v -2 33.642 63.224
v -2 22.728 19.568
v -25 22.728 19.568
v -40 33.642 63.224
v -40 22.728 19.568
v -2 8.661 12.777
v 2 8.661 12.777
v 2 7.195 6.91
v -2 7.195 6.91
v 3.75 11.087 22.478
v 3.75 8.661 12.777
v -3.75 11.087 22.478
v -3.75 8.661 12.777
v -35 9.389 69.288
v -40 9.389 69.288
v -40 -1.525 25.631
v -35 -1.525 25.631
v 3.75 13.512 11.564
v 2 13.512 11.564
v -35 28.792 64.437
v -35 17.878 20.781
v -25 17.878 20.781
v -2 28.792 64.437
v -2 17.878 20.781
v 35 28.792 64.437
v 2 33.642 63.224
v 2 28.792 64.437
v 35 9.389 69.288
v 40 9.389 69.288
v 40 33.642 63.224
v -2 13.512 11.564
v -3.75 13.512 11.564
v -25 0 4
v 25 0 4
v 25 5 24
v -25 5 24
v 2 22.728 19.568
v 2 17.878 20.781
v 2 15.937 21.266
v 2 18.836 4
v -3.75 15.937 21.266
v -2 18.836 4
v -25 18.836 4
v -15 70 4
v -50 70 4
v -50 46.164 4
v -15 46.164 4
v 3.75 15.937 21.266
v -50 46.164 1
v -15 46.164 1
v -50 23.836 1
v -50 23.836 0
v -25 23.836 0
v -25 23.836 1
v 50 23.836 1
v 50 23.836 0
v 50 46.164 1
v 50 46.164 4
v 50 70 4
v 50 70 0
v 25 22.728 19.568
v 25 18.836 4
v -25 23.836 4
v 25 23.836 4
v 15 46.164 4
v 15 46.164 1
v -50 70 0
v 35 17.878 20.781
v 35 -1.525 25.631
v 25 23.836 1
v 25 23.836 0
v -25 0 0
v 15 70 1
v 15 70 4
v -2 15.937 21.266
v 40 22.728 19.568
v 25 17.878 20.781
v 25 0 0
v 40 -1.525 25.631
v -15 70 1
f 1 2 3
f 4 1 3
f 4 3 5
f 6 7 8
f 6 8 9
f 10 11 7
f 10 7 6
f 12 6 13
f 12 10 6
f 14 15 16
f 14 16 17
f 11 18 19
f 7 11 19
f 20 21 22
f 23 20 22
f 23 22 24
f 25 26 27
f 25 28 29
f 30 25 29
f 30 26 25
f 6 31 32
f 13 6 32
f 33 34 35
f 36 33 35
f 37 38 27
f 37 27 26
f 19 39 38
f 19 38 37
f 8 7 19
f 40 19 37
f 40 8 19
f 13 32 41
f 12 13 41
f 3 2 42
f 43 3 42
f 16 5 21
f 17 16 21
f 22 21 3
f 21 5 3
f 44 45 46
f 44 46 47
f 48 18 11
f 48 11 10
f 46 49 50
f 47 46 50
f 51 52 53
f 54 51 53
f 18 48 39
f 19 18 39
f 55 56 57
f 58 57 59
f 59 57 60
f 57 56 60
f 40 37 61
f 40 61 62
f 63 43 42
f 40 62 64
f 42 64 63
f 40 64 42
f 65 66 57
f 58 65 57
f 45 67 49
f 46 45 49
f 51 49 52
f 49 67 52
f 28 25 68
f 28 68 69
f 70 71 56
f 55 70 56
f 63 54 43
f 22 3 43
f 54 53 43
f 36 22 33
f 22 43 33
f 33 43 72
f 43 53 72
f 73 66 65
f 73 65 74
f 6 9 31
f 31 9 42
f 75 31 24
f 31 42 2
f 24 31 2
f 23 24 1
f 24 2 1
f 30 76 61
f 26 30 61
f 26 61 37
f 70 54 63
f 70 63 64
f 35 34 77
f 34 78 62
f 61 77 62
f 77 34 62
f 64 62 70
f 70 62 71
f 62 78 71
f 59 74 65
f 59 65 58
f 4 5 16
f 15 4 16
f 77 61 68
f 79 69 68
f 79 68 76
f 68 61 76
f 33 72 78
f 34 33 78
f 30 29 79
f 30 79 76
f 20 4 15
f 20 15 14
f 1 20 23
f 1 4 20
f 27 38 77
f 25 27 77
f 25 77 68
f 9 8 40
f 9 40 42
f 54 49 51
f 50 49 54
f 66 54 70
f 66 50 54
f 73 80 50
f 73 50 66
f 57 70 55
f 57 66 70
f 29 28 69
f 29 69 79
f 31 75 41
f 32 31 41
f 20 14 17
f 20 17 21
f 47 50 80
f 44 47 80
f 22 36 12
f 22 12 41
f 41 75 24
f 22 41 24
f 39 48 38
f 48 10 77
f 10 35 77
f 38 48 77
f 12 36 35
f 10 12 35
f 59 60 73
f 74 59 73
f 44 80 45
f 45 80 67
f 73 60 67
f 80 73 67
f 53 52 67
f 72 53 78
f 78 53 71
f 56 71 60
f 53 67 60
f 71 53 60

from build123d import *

# Parameters (mm, degrees)
F1_DEPTH  = 1
F0_W      = 50
F0_H      = 23.8363201171
F0_W_2    = 35
F2_DEPTH  = 4
F3_W      = 50
F3_H      = 5
F3_H_2    = 13.8363201171
F4_DEPTH  = 20
F6_DEPTH  = 50
F7_W      = 4
F7_H      = 10
F7_H_2    = 6.0470494551
F8_DEPTH  = 12
F9_START  = -7
F7_W_2    = 1.75
F9_DEPTH  = 5
F10_W     = 23
F10_H     = 5
F11_DEPTH = 45


with BuildPart() as f1:
    # F0 (on Top) → F1 (new body)
    with BuildSketch(Plane.XY):
        Polygon((-50, 46.1636798829), (-50, 23.8363201171), (-25, 23.8363201171), (25, 23.8363201171), (50, 23.8363201171), (50, 46.1636798829), (15, 46.1636798829), (15, 70), (-15, 70), (-15, 46.1636798829), align=None)
    extrude(amount=F1_DEPTH)

    # F0 (on Top) → F2 (join)
    with BuildSketch(Plane.XY):
        with Locations((0, 11.9181600586)):
            Rectangle(F0_W, F0_H)
        with Locations((32.5, 58.0818399414)):
            Rectangle(F0_W_2, F0_H)
        with Locations((-32.5, 58.0818399414)):
            Rectangle(F0_W_2, F0_H)
    extrude(amount=F2_DEPTH)

    # F3 (on face) → F4 (join)
    with BuildSketch(Plane.XY.offset(4)):
        with Locations((0, 21.3363201171)):
            Rectangle(F3_W, F3_H)
        with Locations((0, 11.9181600586)):
            Rectangle(F3_W, F3_H_2)
        with Locations((0, 2.5)):
            Rectangle(F3_W, F3_H)
    extrude(amount=F4_DEPTH)

    # F5 (on face) → F6 (cut)
    with BuildSketch(Plane.YZ.offset(25)):
        Polygon((0, 24), (0, 4), (5, 24), align=None)
        Polygon((22.7283012867, 19.5679246783), (18.8363201171, 4), (23.8363201171, 4), (23.8363201171, 24), align=None)
        Polygon((23.8363201171, 24), (5, 24), (22.7283012867, 19.5679246783), align=None)
    extrude(amount=-F6_DEPTH, mode=Mode.SUBTRACT)

    # F7 (on face) → F8 (cut)
    with BuildSketch(Plane(origin=(0, 16.7871248161, -4.196781204), x_dir=(-1, 0, 0), z_dir=(0, 0.9701425001, -0.242535625))):
        with Locations((0, 19.4960981287)):
            Rectangle(F7_W, F7_H)
        with Locations((0, 11.4725734011)):
            Rectangle(F7_W, F7_H_2)
    extrude(amount=-F8_DEPTH, mode=Mode.SUBTRACT)

    # F7 (on face) → F9 (cut)
    with BuildSketch(Plane(origin=(0, 16.7871248161, -4.196781204), x_dir=(-1, 0, 0), z_dir=(0, 0.9701425001, -0.242535625)).offset(F9_START)):
        with Locations((2.875, 19.4960981287)):
            Rectangle(F7_W_2, F7_H)
        with Locations((-2.875, 19.4960981287)):
            Rectangle(F7_W_2, F7_H)
    extrude(amount=-F9_DEPTH, mode=Mode.SUBTRACT)

    # F10 (on face) → F11 (join)
    with BuildSketch(Plane(origin=(0, 5.9411764706, 23.7647058824), x_dir=(1, 0, 0), z_dir=(0, 0.242535625, 0.9701425001))):
        Polygon((40, 17.3037721918), (25, 17.3037721918), (25, 12.3037721918), (35, 12.3037721918), (35, -7.6962278082), (40, -7.6962278082), align=None)
        with Locations((13.5, 14.8037721918)):
            Rectangle(F10_W, F10_H)
        with Locations((-13.5, 14.8037721918)):
            Rectangle(F10_W, F10_H)
        Polygon((-25, 17.3037721918), (-40, 17.3037721918), (-40, -7.6962278082), (-35, -7.6962278082), (-35, 12.3037721918), (-25, 12.3037721918), align=None)
    extrude(amount=F11_DEPTH)


solid = f1.part
